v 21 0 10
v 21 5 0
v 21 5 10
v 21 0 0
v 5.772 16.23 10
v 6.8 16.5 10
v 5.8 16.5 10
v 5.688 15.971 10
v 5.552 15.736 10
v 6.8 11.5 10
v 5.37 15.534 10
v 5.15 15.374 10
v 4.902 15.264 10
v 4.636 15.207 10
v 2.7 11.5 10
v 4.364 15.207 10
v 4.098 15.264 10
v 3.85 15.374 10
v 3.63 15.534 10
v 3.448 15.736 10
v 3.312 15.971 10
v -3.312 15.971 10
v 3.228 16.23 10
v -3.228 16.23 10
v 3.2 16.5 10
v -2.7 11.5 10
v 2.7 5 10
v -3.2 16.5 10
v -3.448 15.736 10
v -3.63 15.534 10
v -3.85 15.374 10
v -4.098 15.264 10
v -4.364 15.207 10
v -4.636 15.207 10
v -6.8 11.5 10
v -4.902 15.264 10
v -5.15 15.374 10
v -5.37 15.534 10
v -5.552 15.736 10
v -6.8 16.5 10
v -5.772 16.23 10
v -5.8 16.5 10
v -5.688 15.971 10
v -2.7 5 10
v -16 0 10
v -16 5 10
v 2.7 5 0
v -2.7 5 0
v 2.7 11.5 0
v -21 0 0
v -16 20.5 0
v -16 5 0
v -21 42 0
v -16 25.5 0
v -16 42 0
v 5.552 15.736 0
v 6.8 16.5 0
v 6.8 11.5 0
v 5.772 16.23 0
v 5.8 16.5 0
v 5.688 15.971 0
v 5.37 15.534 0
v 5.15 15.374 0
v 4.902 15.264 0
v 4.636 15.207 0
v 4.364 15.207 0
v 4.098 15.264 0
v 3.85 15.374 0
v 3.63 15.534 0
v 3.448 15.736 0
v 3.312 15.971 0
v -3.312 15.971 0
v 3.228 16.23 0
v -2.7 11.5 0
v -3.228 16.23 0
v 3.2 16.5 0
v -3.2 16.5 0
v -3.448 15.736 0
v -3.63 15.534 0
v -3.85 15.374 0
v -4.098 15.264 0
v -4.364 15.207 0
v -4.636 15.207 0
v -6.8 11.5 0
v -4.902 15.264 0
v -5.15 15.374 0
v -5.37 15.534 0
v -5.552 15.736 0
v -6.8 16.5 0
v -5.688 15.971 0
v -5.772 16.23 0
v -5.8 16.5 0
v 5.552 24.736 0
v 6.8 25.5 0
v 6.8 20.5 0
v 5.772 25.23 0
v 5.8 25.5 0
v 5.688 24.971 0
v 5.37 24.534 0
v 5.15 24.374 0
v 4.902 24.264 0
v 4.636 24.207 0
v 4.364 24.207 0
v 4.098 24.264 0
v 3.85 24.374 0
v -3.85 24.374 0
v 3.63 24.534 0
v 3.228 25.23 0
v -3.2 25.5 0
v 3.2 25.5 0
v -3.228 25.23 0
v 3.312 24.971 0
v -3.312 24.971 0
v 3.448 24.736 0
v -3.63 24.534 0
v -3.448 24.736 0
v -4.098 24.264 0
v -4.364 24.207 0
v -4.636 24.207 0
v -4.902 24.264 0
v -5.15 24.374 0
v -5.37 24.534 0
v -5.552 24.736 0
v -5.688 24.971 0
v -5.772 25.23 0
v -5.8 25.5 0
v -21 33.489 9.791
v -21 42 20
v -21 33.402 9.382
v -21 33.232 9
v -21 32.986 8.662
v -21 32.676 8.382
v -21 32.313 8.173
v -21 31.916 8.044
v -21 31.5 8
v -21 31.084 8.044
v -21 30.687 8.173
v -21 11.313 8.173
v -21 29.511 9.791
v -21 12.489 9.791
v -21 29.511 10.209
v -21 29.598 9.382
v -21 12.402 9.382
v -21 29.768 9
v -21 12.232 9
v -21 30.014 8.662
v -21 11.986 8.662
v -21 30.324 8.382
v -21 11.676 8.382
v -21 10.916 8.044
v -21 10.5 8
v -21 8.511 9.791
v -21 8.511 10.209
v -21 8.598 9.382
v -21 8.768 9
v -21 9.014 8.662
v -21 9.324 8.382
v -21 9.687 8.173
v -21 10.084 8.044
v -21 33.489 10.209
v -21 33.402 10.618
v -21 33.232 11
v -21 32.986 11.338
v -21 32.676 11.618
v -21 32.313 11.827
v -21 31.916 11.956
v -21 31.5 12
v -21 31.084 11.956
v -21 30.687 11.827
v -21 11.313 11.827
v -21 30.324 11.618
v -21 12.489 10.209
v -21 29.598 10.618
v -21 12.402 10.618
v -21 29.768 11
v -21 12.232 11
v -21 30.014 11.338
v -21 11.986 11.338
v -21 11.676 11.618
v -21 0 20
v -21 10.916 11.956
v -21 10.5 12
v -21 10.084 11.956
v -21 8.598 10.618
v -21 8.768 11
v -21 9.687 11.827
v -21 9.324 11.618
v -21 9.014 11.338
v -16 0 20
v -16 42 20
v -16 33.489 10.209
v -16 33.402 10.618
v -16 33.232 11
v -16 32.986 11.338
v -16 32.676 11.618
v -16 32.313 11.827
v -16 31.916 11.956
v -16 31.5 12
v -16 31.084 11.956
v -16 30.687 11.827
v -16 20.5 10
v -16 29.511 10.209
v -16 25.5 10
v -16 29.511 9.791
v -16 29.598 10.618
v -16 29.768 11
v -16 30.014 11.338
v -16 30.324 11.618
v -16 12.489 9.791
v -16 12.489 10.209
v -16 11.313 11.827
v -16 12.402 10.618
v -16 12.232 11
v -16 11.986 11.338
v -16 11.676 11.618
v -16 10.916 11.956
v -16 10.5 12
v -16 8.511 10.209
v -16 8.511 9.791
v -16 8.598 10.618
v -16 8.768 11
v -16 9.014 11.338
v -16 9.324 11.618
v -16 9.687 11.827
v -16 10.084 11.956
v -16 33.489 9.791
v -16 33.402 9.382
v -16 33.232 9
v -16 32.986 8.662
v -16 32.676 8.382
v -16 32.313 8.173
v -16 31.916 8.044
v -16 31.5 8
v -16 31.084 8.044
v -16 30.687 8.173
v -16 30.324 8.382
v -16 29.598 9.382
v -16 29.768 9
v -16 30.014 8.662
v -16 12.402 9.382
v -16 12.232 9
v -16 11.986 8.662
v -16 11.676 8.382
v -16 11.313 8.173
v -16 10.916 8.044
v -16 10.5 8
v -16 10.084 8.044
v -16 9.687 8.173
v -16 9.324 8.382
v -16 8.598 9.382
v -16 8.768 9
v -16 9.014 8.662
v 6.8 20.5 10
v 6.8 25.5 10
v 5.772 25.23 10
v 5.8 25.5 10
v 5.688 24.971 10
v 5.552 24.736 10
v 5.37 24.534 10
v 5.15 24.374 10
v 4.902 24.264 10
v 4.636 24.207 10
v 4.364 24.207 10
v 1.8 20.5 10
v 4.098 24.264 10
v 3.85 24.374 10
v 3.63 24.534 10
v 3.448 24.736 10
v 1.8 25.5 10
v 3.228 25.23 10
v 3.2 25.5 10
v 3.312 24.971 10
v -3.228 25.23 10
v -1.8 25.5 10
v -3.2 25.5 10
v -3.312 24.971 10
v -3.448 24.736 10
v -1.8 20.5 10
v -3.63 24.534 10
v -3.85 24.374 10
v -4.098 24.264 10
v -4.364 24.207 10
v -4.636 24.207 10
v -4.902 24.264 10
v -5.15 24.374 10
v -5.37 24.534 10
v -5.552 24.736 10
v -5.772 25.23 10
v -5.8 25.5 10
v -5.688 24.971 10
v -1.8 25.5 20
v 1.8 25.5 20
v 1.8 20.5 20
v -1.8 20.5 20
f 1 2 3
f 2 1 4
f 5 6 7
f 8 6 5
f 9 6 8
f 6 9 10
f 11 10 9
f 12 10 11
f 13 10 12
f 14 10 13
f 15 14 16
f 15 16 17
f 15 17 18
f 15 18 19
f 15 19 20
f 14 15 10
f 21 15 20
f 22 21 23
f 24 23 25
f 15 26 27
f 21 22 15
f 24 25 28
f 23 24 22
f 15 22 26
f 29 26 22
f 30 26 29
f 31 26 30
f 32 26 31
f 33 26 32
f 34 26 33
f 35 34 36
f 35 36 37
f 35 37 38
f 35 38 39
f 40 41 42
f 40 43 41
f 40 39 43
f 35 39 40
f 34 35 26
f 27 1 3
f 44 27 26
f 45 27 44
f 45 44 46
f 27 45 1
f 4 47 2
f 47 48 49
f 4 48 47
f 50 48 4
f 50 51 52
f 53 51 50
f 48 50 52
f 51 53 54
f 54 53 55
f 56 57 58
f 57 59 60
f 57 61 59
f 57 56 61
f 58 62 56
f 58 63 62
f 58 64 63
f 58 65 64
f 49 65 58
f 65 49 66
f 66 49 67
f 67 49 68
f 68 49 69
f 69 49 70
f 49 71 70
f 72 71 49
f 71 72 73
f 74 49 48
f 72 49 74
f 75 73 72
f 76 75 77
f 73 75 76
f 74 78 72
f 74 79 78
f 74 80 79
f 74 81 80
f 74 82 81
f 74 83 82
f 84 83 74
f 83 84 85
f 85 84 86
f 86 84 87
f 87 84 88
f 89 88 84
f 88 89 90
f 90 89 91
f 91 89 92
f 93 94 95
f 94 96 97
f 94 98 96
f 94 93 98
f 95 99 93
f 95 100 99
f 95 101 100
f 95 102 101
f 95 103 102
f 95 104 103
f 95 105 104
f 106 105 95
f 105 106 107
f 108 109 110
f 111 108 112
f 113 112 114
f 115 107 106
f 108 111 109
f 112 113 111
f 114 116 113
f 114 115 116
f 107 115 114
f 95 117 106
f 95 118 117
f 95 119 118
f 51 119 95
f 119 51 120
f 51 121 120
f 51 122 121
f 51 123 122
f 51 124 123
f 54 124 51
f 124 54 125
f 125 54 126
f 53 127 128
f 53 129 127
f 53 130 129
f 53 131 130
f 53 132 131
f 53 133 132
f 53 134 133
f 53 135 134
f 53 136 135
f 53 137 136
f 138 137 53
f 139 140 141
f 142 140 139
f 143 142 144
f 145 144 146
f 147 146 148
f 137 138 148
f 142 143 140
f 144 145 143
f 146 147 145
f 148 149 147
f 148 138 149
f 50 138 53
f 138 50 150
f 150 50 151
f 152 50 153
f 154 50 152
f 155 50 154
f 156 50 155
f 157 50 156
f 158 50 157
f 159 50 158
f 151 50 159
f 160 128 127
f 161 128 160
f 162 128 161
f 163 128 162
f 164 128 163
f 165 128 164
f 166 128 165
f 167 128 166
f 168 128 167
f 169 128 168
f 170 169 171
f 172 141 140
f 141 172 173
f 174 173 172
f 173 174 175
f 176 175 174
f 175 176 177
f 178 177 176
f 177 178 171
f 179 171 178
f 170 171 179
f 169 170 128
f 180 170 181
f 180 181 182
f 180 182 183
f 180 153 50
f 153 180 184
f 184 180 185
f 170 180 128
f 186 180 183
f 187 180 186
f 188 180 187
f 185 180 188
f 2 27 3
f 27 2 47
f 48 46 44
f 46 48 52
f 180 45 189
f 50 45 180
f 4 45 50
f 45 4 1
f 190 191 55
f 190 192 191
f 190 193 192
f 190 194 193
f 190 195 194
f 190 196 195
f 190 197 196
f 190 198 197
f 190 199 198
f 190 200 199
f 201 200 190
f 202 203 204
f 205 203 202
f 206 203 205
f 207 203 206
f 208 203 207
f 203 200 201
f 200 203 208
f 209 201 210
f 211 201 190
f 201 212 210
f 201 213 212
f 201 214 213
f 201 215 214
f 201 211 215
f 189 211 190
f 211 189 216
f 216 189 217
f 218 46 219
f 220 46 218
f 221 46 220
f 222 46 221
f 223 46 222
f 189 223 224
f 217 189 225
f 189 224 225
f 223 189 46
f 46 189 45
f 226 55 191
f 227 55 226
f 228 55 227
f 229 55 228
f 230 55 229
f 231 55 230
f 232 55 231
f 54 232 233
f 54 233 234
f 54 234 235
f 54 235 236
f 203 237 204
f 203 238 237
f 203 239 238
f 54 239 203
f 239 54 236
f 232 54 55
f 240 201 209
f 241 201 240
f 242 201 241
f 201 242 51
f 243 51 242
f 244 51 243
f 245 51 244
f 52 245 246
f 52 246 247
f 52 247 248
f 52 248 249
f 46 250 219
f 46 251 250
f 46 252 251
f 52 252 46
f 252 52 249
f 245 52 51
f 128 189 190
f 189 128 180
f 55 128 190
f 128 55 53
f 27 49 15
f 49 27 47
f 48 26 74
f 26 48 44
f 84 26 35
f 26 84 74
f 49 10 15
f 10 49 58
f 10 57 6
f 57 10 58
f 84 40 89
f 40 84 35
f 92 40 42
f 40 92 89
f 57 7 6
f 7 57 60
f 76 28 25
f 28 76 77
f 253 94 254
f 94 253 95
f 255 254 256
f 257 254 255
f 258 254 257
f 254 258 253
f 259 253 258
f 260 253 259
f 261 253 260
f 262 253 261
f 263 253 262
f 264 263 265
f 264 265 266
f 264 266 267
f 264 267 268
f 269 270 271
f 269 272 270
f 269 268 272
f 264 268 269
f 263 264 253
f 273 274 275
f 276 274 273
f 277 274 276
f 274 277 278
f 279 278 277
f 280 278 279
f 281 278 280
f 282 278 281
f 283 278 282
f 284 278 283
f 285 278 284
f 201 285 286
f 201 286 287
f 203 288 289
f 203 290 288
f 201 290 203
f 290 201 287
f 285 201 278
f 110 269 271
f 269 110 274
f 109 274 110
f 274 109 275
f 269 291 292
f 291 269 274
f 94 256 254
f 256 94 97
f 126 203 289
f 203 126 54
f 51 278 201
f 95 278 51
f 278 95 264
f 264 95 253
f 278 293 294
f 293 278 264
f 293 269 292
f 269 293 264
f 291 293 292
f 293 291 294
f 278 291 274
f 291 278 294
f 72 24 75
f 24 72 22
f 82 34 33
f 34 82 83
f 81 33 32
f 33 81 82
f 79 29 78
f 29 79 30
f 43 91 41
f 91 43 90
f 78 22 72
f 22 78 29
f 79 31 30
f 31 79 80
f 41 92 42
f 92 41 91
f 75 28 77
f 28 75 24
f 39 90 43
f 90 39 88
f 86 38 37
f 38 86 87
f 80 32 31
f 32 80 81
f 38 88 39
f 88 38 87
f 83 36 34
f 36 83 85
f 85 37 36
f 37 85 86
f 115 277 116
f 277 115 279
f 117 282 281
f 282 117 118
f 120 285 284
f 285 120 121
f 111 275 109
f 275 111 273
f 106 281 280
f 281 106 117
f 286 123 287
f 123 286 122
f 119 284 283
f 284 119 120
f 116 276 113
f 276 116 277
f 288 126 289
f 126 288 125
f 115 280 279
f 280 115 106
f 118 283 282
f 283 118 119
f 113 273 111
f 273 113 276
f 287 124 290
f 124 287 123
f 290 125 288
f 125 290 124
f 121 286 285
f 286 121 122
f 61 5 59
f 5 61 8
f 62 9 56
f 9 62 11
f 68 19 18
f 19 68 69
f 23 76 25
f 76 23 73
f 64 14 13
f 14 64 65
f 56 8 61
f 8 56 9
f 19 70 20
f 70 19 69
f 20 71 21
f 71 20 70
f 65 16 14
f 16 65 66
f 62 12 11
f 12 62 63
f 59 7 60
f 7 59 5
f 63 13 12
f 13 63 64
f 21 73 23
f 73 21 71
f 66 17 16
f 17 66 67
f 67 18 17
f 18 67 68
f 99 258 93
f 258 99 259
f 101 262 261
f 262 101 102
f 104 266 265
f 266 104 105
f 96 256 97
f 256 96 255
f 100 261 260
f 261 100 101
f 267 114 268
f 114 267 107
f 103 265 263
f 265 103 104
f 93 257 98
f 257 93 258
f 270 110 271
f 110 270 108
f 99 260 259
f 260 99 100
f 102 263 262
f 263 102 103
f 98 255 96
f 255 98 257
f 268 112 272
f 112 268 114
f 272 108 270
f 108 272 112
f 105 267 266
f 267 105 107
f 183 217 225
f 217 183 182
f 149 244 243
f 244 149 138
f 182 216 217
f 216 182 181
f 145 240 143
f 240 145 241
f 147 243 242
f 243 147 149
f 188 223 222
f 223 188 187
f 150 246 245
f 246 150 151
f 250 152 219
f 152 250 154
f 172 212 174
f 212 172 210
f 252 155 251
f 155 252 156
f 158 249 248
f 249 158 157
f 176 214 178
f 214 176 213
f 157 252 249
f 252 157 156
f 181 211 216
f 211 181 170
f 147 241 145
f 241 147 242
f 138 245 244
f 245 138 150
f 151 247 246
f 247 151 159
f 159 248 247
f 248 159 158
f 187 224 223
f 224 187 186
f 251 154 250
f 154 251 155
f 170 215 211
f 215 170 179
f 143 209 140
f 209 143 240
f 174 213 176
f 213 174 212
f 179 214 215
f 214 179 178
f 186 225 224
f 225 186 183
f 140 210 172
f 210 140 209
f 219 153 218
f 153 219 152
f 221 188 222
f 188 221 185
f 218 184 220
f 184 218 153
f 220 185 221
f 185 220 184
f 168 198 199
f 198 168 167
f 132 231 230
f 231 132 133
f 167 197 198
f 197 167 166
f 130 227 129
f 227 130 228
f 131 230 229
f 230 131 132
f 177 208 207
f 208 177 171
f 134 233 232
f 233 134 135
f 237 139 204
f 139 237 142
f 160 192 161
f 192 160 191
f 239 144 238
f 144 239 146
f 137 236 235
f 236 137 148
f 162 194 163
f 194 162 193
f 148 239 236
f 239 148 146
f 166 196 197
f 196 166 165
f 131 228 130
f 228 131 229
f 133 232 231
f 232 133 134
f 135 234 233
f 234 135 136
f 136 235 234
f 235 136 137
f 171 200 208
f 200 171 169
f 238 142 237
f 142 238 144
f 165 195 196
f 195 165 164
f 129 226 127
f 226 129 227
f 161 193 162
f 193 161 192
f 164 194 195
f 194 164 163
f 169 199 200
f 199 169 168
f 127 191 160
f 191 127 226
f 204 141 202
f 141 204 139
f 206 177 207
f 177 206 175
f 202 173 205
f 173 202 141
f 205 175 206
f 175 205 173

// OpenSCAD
depth = 10.0;
ball_diameter = 40.0;
height = ball_diameter+2;
rod_thickness = 2.6;
strut_thickness = 5.0;
sep = 9.0;
screw_hole = 4.0;
tower_width = sep - rod_thickness - 1.0;
balcony_width = sep + rod_thickness + 2.0;
balcony_height = height/2 - sep/2 -strut_thickness;
spar_height = height/2 + sep/2 - strut_thickness;
tower_height = balcony_height;

$fn = 30;

module rods() {
    translate([0, height/2, 0])
    for(i = [-sep/2, sep/2]) {
       for(j =  [-sep/2, sep/2]) {
           translate([i,j,0]) cylinder(h=depth*4, d=rod_thickness, center=true);
       }
   }
}

module main_block() {
    //L shape
    translate([-height/2,0,0]) cube([height, strut_thickness, depth]);
    translate([-height/2,0,0]) cube([strut_thickness, height, depth*2]);
    translate([-tower_width/2,0,0]) cube([tower_width, tower_height, depth]);
    translate([-balcony_width/2, balcony_height,0]) 
        cube([balcony_width, strut_thickness, depth]);
    translate([-height/2, spar_height, 0]) 
        cube([height/2 + balcony_width/2, strut_thickness, depth]);
    translate([-tower_width/3, spar_height, 0]) 
        cube([tower_width*2/3, strut_thickness, depth*2]);
}

module screw_holes() {
    for (i=[height/4, height*3/4]) {
    translate([-height/2, i, depth])
    rotate([0,90,0])    
    cylinder(d = screw_hole, h = strut_thickness*3, center = true);
    }
}



difference() {
    main_block();
    rods();
    screw_holes();
}
